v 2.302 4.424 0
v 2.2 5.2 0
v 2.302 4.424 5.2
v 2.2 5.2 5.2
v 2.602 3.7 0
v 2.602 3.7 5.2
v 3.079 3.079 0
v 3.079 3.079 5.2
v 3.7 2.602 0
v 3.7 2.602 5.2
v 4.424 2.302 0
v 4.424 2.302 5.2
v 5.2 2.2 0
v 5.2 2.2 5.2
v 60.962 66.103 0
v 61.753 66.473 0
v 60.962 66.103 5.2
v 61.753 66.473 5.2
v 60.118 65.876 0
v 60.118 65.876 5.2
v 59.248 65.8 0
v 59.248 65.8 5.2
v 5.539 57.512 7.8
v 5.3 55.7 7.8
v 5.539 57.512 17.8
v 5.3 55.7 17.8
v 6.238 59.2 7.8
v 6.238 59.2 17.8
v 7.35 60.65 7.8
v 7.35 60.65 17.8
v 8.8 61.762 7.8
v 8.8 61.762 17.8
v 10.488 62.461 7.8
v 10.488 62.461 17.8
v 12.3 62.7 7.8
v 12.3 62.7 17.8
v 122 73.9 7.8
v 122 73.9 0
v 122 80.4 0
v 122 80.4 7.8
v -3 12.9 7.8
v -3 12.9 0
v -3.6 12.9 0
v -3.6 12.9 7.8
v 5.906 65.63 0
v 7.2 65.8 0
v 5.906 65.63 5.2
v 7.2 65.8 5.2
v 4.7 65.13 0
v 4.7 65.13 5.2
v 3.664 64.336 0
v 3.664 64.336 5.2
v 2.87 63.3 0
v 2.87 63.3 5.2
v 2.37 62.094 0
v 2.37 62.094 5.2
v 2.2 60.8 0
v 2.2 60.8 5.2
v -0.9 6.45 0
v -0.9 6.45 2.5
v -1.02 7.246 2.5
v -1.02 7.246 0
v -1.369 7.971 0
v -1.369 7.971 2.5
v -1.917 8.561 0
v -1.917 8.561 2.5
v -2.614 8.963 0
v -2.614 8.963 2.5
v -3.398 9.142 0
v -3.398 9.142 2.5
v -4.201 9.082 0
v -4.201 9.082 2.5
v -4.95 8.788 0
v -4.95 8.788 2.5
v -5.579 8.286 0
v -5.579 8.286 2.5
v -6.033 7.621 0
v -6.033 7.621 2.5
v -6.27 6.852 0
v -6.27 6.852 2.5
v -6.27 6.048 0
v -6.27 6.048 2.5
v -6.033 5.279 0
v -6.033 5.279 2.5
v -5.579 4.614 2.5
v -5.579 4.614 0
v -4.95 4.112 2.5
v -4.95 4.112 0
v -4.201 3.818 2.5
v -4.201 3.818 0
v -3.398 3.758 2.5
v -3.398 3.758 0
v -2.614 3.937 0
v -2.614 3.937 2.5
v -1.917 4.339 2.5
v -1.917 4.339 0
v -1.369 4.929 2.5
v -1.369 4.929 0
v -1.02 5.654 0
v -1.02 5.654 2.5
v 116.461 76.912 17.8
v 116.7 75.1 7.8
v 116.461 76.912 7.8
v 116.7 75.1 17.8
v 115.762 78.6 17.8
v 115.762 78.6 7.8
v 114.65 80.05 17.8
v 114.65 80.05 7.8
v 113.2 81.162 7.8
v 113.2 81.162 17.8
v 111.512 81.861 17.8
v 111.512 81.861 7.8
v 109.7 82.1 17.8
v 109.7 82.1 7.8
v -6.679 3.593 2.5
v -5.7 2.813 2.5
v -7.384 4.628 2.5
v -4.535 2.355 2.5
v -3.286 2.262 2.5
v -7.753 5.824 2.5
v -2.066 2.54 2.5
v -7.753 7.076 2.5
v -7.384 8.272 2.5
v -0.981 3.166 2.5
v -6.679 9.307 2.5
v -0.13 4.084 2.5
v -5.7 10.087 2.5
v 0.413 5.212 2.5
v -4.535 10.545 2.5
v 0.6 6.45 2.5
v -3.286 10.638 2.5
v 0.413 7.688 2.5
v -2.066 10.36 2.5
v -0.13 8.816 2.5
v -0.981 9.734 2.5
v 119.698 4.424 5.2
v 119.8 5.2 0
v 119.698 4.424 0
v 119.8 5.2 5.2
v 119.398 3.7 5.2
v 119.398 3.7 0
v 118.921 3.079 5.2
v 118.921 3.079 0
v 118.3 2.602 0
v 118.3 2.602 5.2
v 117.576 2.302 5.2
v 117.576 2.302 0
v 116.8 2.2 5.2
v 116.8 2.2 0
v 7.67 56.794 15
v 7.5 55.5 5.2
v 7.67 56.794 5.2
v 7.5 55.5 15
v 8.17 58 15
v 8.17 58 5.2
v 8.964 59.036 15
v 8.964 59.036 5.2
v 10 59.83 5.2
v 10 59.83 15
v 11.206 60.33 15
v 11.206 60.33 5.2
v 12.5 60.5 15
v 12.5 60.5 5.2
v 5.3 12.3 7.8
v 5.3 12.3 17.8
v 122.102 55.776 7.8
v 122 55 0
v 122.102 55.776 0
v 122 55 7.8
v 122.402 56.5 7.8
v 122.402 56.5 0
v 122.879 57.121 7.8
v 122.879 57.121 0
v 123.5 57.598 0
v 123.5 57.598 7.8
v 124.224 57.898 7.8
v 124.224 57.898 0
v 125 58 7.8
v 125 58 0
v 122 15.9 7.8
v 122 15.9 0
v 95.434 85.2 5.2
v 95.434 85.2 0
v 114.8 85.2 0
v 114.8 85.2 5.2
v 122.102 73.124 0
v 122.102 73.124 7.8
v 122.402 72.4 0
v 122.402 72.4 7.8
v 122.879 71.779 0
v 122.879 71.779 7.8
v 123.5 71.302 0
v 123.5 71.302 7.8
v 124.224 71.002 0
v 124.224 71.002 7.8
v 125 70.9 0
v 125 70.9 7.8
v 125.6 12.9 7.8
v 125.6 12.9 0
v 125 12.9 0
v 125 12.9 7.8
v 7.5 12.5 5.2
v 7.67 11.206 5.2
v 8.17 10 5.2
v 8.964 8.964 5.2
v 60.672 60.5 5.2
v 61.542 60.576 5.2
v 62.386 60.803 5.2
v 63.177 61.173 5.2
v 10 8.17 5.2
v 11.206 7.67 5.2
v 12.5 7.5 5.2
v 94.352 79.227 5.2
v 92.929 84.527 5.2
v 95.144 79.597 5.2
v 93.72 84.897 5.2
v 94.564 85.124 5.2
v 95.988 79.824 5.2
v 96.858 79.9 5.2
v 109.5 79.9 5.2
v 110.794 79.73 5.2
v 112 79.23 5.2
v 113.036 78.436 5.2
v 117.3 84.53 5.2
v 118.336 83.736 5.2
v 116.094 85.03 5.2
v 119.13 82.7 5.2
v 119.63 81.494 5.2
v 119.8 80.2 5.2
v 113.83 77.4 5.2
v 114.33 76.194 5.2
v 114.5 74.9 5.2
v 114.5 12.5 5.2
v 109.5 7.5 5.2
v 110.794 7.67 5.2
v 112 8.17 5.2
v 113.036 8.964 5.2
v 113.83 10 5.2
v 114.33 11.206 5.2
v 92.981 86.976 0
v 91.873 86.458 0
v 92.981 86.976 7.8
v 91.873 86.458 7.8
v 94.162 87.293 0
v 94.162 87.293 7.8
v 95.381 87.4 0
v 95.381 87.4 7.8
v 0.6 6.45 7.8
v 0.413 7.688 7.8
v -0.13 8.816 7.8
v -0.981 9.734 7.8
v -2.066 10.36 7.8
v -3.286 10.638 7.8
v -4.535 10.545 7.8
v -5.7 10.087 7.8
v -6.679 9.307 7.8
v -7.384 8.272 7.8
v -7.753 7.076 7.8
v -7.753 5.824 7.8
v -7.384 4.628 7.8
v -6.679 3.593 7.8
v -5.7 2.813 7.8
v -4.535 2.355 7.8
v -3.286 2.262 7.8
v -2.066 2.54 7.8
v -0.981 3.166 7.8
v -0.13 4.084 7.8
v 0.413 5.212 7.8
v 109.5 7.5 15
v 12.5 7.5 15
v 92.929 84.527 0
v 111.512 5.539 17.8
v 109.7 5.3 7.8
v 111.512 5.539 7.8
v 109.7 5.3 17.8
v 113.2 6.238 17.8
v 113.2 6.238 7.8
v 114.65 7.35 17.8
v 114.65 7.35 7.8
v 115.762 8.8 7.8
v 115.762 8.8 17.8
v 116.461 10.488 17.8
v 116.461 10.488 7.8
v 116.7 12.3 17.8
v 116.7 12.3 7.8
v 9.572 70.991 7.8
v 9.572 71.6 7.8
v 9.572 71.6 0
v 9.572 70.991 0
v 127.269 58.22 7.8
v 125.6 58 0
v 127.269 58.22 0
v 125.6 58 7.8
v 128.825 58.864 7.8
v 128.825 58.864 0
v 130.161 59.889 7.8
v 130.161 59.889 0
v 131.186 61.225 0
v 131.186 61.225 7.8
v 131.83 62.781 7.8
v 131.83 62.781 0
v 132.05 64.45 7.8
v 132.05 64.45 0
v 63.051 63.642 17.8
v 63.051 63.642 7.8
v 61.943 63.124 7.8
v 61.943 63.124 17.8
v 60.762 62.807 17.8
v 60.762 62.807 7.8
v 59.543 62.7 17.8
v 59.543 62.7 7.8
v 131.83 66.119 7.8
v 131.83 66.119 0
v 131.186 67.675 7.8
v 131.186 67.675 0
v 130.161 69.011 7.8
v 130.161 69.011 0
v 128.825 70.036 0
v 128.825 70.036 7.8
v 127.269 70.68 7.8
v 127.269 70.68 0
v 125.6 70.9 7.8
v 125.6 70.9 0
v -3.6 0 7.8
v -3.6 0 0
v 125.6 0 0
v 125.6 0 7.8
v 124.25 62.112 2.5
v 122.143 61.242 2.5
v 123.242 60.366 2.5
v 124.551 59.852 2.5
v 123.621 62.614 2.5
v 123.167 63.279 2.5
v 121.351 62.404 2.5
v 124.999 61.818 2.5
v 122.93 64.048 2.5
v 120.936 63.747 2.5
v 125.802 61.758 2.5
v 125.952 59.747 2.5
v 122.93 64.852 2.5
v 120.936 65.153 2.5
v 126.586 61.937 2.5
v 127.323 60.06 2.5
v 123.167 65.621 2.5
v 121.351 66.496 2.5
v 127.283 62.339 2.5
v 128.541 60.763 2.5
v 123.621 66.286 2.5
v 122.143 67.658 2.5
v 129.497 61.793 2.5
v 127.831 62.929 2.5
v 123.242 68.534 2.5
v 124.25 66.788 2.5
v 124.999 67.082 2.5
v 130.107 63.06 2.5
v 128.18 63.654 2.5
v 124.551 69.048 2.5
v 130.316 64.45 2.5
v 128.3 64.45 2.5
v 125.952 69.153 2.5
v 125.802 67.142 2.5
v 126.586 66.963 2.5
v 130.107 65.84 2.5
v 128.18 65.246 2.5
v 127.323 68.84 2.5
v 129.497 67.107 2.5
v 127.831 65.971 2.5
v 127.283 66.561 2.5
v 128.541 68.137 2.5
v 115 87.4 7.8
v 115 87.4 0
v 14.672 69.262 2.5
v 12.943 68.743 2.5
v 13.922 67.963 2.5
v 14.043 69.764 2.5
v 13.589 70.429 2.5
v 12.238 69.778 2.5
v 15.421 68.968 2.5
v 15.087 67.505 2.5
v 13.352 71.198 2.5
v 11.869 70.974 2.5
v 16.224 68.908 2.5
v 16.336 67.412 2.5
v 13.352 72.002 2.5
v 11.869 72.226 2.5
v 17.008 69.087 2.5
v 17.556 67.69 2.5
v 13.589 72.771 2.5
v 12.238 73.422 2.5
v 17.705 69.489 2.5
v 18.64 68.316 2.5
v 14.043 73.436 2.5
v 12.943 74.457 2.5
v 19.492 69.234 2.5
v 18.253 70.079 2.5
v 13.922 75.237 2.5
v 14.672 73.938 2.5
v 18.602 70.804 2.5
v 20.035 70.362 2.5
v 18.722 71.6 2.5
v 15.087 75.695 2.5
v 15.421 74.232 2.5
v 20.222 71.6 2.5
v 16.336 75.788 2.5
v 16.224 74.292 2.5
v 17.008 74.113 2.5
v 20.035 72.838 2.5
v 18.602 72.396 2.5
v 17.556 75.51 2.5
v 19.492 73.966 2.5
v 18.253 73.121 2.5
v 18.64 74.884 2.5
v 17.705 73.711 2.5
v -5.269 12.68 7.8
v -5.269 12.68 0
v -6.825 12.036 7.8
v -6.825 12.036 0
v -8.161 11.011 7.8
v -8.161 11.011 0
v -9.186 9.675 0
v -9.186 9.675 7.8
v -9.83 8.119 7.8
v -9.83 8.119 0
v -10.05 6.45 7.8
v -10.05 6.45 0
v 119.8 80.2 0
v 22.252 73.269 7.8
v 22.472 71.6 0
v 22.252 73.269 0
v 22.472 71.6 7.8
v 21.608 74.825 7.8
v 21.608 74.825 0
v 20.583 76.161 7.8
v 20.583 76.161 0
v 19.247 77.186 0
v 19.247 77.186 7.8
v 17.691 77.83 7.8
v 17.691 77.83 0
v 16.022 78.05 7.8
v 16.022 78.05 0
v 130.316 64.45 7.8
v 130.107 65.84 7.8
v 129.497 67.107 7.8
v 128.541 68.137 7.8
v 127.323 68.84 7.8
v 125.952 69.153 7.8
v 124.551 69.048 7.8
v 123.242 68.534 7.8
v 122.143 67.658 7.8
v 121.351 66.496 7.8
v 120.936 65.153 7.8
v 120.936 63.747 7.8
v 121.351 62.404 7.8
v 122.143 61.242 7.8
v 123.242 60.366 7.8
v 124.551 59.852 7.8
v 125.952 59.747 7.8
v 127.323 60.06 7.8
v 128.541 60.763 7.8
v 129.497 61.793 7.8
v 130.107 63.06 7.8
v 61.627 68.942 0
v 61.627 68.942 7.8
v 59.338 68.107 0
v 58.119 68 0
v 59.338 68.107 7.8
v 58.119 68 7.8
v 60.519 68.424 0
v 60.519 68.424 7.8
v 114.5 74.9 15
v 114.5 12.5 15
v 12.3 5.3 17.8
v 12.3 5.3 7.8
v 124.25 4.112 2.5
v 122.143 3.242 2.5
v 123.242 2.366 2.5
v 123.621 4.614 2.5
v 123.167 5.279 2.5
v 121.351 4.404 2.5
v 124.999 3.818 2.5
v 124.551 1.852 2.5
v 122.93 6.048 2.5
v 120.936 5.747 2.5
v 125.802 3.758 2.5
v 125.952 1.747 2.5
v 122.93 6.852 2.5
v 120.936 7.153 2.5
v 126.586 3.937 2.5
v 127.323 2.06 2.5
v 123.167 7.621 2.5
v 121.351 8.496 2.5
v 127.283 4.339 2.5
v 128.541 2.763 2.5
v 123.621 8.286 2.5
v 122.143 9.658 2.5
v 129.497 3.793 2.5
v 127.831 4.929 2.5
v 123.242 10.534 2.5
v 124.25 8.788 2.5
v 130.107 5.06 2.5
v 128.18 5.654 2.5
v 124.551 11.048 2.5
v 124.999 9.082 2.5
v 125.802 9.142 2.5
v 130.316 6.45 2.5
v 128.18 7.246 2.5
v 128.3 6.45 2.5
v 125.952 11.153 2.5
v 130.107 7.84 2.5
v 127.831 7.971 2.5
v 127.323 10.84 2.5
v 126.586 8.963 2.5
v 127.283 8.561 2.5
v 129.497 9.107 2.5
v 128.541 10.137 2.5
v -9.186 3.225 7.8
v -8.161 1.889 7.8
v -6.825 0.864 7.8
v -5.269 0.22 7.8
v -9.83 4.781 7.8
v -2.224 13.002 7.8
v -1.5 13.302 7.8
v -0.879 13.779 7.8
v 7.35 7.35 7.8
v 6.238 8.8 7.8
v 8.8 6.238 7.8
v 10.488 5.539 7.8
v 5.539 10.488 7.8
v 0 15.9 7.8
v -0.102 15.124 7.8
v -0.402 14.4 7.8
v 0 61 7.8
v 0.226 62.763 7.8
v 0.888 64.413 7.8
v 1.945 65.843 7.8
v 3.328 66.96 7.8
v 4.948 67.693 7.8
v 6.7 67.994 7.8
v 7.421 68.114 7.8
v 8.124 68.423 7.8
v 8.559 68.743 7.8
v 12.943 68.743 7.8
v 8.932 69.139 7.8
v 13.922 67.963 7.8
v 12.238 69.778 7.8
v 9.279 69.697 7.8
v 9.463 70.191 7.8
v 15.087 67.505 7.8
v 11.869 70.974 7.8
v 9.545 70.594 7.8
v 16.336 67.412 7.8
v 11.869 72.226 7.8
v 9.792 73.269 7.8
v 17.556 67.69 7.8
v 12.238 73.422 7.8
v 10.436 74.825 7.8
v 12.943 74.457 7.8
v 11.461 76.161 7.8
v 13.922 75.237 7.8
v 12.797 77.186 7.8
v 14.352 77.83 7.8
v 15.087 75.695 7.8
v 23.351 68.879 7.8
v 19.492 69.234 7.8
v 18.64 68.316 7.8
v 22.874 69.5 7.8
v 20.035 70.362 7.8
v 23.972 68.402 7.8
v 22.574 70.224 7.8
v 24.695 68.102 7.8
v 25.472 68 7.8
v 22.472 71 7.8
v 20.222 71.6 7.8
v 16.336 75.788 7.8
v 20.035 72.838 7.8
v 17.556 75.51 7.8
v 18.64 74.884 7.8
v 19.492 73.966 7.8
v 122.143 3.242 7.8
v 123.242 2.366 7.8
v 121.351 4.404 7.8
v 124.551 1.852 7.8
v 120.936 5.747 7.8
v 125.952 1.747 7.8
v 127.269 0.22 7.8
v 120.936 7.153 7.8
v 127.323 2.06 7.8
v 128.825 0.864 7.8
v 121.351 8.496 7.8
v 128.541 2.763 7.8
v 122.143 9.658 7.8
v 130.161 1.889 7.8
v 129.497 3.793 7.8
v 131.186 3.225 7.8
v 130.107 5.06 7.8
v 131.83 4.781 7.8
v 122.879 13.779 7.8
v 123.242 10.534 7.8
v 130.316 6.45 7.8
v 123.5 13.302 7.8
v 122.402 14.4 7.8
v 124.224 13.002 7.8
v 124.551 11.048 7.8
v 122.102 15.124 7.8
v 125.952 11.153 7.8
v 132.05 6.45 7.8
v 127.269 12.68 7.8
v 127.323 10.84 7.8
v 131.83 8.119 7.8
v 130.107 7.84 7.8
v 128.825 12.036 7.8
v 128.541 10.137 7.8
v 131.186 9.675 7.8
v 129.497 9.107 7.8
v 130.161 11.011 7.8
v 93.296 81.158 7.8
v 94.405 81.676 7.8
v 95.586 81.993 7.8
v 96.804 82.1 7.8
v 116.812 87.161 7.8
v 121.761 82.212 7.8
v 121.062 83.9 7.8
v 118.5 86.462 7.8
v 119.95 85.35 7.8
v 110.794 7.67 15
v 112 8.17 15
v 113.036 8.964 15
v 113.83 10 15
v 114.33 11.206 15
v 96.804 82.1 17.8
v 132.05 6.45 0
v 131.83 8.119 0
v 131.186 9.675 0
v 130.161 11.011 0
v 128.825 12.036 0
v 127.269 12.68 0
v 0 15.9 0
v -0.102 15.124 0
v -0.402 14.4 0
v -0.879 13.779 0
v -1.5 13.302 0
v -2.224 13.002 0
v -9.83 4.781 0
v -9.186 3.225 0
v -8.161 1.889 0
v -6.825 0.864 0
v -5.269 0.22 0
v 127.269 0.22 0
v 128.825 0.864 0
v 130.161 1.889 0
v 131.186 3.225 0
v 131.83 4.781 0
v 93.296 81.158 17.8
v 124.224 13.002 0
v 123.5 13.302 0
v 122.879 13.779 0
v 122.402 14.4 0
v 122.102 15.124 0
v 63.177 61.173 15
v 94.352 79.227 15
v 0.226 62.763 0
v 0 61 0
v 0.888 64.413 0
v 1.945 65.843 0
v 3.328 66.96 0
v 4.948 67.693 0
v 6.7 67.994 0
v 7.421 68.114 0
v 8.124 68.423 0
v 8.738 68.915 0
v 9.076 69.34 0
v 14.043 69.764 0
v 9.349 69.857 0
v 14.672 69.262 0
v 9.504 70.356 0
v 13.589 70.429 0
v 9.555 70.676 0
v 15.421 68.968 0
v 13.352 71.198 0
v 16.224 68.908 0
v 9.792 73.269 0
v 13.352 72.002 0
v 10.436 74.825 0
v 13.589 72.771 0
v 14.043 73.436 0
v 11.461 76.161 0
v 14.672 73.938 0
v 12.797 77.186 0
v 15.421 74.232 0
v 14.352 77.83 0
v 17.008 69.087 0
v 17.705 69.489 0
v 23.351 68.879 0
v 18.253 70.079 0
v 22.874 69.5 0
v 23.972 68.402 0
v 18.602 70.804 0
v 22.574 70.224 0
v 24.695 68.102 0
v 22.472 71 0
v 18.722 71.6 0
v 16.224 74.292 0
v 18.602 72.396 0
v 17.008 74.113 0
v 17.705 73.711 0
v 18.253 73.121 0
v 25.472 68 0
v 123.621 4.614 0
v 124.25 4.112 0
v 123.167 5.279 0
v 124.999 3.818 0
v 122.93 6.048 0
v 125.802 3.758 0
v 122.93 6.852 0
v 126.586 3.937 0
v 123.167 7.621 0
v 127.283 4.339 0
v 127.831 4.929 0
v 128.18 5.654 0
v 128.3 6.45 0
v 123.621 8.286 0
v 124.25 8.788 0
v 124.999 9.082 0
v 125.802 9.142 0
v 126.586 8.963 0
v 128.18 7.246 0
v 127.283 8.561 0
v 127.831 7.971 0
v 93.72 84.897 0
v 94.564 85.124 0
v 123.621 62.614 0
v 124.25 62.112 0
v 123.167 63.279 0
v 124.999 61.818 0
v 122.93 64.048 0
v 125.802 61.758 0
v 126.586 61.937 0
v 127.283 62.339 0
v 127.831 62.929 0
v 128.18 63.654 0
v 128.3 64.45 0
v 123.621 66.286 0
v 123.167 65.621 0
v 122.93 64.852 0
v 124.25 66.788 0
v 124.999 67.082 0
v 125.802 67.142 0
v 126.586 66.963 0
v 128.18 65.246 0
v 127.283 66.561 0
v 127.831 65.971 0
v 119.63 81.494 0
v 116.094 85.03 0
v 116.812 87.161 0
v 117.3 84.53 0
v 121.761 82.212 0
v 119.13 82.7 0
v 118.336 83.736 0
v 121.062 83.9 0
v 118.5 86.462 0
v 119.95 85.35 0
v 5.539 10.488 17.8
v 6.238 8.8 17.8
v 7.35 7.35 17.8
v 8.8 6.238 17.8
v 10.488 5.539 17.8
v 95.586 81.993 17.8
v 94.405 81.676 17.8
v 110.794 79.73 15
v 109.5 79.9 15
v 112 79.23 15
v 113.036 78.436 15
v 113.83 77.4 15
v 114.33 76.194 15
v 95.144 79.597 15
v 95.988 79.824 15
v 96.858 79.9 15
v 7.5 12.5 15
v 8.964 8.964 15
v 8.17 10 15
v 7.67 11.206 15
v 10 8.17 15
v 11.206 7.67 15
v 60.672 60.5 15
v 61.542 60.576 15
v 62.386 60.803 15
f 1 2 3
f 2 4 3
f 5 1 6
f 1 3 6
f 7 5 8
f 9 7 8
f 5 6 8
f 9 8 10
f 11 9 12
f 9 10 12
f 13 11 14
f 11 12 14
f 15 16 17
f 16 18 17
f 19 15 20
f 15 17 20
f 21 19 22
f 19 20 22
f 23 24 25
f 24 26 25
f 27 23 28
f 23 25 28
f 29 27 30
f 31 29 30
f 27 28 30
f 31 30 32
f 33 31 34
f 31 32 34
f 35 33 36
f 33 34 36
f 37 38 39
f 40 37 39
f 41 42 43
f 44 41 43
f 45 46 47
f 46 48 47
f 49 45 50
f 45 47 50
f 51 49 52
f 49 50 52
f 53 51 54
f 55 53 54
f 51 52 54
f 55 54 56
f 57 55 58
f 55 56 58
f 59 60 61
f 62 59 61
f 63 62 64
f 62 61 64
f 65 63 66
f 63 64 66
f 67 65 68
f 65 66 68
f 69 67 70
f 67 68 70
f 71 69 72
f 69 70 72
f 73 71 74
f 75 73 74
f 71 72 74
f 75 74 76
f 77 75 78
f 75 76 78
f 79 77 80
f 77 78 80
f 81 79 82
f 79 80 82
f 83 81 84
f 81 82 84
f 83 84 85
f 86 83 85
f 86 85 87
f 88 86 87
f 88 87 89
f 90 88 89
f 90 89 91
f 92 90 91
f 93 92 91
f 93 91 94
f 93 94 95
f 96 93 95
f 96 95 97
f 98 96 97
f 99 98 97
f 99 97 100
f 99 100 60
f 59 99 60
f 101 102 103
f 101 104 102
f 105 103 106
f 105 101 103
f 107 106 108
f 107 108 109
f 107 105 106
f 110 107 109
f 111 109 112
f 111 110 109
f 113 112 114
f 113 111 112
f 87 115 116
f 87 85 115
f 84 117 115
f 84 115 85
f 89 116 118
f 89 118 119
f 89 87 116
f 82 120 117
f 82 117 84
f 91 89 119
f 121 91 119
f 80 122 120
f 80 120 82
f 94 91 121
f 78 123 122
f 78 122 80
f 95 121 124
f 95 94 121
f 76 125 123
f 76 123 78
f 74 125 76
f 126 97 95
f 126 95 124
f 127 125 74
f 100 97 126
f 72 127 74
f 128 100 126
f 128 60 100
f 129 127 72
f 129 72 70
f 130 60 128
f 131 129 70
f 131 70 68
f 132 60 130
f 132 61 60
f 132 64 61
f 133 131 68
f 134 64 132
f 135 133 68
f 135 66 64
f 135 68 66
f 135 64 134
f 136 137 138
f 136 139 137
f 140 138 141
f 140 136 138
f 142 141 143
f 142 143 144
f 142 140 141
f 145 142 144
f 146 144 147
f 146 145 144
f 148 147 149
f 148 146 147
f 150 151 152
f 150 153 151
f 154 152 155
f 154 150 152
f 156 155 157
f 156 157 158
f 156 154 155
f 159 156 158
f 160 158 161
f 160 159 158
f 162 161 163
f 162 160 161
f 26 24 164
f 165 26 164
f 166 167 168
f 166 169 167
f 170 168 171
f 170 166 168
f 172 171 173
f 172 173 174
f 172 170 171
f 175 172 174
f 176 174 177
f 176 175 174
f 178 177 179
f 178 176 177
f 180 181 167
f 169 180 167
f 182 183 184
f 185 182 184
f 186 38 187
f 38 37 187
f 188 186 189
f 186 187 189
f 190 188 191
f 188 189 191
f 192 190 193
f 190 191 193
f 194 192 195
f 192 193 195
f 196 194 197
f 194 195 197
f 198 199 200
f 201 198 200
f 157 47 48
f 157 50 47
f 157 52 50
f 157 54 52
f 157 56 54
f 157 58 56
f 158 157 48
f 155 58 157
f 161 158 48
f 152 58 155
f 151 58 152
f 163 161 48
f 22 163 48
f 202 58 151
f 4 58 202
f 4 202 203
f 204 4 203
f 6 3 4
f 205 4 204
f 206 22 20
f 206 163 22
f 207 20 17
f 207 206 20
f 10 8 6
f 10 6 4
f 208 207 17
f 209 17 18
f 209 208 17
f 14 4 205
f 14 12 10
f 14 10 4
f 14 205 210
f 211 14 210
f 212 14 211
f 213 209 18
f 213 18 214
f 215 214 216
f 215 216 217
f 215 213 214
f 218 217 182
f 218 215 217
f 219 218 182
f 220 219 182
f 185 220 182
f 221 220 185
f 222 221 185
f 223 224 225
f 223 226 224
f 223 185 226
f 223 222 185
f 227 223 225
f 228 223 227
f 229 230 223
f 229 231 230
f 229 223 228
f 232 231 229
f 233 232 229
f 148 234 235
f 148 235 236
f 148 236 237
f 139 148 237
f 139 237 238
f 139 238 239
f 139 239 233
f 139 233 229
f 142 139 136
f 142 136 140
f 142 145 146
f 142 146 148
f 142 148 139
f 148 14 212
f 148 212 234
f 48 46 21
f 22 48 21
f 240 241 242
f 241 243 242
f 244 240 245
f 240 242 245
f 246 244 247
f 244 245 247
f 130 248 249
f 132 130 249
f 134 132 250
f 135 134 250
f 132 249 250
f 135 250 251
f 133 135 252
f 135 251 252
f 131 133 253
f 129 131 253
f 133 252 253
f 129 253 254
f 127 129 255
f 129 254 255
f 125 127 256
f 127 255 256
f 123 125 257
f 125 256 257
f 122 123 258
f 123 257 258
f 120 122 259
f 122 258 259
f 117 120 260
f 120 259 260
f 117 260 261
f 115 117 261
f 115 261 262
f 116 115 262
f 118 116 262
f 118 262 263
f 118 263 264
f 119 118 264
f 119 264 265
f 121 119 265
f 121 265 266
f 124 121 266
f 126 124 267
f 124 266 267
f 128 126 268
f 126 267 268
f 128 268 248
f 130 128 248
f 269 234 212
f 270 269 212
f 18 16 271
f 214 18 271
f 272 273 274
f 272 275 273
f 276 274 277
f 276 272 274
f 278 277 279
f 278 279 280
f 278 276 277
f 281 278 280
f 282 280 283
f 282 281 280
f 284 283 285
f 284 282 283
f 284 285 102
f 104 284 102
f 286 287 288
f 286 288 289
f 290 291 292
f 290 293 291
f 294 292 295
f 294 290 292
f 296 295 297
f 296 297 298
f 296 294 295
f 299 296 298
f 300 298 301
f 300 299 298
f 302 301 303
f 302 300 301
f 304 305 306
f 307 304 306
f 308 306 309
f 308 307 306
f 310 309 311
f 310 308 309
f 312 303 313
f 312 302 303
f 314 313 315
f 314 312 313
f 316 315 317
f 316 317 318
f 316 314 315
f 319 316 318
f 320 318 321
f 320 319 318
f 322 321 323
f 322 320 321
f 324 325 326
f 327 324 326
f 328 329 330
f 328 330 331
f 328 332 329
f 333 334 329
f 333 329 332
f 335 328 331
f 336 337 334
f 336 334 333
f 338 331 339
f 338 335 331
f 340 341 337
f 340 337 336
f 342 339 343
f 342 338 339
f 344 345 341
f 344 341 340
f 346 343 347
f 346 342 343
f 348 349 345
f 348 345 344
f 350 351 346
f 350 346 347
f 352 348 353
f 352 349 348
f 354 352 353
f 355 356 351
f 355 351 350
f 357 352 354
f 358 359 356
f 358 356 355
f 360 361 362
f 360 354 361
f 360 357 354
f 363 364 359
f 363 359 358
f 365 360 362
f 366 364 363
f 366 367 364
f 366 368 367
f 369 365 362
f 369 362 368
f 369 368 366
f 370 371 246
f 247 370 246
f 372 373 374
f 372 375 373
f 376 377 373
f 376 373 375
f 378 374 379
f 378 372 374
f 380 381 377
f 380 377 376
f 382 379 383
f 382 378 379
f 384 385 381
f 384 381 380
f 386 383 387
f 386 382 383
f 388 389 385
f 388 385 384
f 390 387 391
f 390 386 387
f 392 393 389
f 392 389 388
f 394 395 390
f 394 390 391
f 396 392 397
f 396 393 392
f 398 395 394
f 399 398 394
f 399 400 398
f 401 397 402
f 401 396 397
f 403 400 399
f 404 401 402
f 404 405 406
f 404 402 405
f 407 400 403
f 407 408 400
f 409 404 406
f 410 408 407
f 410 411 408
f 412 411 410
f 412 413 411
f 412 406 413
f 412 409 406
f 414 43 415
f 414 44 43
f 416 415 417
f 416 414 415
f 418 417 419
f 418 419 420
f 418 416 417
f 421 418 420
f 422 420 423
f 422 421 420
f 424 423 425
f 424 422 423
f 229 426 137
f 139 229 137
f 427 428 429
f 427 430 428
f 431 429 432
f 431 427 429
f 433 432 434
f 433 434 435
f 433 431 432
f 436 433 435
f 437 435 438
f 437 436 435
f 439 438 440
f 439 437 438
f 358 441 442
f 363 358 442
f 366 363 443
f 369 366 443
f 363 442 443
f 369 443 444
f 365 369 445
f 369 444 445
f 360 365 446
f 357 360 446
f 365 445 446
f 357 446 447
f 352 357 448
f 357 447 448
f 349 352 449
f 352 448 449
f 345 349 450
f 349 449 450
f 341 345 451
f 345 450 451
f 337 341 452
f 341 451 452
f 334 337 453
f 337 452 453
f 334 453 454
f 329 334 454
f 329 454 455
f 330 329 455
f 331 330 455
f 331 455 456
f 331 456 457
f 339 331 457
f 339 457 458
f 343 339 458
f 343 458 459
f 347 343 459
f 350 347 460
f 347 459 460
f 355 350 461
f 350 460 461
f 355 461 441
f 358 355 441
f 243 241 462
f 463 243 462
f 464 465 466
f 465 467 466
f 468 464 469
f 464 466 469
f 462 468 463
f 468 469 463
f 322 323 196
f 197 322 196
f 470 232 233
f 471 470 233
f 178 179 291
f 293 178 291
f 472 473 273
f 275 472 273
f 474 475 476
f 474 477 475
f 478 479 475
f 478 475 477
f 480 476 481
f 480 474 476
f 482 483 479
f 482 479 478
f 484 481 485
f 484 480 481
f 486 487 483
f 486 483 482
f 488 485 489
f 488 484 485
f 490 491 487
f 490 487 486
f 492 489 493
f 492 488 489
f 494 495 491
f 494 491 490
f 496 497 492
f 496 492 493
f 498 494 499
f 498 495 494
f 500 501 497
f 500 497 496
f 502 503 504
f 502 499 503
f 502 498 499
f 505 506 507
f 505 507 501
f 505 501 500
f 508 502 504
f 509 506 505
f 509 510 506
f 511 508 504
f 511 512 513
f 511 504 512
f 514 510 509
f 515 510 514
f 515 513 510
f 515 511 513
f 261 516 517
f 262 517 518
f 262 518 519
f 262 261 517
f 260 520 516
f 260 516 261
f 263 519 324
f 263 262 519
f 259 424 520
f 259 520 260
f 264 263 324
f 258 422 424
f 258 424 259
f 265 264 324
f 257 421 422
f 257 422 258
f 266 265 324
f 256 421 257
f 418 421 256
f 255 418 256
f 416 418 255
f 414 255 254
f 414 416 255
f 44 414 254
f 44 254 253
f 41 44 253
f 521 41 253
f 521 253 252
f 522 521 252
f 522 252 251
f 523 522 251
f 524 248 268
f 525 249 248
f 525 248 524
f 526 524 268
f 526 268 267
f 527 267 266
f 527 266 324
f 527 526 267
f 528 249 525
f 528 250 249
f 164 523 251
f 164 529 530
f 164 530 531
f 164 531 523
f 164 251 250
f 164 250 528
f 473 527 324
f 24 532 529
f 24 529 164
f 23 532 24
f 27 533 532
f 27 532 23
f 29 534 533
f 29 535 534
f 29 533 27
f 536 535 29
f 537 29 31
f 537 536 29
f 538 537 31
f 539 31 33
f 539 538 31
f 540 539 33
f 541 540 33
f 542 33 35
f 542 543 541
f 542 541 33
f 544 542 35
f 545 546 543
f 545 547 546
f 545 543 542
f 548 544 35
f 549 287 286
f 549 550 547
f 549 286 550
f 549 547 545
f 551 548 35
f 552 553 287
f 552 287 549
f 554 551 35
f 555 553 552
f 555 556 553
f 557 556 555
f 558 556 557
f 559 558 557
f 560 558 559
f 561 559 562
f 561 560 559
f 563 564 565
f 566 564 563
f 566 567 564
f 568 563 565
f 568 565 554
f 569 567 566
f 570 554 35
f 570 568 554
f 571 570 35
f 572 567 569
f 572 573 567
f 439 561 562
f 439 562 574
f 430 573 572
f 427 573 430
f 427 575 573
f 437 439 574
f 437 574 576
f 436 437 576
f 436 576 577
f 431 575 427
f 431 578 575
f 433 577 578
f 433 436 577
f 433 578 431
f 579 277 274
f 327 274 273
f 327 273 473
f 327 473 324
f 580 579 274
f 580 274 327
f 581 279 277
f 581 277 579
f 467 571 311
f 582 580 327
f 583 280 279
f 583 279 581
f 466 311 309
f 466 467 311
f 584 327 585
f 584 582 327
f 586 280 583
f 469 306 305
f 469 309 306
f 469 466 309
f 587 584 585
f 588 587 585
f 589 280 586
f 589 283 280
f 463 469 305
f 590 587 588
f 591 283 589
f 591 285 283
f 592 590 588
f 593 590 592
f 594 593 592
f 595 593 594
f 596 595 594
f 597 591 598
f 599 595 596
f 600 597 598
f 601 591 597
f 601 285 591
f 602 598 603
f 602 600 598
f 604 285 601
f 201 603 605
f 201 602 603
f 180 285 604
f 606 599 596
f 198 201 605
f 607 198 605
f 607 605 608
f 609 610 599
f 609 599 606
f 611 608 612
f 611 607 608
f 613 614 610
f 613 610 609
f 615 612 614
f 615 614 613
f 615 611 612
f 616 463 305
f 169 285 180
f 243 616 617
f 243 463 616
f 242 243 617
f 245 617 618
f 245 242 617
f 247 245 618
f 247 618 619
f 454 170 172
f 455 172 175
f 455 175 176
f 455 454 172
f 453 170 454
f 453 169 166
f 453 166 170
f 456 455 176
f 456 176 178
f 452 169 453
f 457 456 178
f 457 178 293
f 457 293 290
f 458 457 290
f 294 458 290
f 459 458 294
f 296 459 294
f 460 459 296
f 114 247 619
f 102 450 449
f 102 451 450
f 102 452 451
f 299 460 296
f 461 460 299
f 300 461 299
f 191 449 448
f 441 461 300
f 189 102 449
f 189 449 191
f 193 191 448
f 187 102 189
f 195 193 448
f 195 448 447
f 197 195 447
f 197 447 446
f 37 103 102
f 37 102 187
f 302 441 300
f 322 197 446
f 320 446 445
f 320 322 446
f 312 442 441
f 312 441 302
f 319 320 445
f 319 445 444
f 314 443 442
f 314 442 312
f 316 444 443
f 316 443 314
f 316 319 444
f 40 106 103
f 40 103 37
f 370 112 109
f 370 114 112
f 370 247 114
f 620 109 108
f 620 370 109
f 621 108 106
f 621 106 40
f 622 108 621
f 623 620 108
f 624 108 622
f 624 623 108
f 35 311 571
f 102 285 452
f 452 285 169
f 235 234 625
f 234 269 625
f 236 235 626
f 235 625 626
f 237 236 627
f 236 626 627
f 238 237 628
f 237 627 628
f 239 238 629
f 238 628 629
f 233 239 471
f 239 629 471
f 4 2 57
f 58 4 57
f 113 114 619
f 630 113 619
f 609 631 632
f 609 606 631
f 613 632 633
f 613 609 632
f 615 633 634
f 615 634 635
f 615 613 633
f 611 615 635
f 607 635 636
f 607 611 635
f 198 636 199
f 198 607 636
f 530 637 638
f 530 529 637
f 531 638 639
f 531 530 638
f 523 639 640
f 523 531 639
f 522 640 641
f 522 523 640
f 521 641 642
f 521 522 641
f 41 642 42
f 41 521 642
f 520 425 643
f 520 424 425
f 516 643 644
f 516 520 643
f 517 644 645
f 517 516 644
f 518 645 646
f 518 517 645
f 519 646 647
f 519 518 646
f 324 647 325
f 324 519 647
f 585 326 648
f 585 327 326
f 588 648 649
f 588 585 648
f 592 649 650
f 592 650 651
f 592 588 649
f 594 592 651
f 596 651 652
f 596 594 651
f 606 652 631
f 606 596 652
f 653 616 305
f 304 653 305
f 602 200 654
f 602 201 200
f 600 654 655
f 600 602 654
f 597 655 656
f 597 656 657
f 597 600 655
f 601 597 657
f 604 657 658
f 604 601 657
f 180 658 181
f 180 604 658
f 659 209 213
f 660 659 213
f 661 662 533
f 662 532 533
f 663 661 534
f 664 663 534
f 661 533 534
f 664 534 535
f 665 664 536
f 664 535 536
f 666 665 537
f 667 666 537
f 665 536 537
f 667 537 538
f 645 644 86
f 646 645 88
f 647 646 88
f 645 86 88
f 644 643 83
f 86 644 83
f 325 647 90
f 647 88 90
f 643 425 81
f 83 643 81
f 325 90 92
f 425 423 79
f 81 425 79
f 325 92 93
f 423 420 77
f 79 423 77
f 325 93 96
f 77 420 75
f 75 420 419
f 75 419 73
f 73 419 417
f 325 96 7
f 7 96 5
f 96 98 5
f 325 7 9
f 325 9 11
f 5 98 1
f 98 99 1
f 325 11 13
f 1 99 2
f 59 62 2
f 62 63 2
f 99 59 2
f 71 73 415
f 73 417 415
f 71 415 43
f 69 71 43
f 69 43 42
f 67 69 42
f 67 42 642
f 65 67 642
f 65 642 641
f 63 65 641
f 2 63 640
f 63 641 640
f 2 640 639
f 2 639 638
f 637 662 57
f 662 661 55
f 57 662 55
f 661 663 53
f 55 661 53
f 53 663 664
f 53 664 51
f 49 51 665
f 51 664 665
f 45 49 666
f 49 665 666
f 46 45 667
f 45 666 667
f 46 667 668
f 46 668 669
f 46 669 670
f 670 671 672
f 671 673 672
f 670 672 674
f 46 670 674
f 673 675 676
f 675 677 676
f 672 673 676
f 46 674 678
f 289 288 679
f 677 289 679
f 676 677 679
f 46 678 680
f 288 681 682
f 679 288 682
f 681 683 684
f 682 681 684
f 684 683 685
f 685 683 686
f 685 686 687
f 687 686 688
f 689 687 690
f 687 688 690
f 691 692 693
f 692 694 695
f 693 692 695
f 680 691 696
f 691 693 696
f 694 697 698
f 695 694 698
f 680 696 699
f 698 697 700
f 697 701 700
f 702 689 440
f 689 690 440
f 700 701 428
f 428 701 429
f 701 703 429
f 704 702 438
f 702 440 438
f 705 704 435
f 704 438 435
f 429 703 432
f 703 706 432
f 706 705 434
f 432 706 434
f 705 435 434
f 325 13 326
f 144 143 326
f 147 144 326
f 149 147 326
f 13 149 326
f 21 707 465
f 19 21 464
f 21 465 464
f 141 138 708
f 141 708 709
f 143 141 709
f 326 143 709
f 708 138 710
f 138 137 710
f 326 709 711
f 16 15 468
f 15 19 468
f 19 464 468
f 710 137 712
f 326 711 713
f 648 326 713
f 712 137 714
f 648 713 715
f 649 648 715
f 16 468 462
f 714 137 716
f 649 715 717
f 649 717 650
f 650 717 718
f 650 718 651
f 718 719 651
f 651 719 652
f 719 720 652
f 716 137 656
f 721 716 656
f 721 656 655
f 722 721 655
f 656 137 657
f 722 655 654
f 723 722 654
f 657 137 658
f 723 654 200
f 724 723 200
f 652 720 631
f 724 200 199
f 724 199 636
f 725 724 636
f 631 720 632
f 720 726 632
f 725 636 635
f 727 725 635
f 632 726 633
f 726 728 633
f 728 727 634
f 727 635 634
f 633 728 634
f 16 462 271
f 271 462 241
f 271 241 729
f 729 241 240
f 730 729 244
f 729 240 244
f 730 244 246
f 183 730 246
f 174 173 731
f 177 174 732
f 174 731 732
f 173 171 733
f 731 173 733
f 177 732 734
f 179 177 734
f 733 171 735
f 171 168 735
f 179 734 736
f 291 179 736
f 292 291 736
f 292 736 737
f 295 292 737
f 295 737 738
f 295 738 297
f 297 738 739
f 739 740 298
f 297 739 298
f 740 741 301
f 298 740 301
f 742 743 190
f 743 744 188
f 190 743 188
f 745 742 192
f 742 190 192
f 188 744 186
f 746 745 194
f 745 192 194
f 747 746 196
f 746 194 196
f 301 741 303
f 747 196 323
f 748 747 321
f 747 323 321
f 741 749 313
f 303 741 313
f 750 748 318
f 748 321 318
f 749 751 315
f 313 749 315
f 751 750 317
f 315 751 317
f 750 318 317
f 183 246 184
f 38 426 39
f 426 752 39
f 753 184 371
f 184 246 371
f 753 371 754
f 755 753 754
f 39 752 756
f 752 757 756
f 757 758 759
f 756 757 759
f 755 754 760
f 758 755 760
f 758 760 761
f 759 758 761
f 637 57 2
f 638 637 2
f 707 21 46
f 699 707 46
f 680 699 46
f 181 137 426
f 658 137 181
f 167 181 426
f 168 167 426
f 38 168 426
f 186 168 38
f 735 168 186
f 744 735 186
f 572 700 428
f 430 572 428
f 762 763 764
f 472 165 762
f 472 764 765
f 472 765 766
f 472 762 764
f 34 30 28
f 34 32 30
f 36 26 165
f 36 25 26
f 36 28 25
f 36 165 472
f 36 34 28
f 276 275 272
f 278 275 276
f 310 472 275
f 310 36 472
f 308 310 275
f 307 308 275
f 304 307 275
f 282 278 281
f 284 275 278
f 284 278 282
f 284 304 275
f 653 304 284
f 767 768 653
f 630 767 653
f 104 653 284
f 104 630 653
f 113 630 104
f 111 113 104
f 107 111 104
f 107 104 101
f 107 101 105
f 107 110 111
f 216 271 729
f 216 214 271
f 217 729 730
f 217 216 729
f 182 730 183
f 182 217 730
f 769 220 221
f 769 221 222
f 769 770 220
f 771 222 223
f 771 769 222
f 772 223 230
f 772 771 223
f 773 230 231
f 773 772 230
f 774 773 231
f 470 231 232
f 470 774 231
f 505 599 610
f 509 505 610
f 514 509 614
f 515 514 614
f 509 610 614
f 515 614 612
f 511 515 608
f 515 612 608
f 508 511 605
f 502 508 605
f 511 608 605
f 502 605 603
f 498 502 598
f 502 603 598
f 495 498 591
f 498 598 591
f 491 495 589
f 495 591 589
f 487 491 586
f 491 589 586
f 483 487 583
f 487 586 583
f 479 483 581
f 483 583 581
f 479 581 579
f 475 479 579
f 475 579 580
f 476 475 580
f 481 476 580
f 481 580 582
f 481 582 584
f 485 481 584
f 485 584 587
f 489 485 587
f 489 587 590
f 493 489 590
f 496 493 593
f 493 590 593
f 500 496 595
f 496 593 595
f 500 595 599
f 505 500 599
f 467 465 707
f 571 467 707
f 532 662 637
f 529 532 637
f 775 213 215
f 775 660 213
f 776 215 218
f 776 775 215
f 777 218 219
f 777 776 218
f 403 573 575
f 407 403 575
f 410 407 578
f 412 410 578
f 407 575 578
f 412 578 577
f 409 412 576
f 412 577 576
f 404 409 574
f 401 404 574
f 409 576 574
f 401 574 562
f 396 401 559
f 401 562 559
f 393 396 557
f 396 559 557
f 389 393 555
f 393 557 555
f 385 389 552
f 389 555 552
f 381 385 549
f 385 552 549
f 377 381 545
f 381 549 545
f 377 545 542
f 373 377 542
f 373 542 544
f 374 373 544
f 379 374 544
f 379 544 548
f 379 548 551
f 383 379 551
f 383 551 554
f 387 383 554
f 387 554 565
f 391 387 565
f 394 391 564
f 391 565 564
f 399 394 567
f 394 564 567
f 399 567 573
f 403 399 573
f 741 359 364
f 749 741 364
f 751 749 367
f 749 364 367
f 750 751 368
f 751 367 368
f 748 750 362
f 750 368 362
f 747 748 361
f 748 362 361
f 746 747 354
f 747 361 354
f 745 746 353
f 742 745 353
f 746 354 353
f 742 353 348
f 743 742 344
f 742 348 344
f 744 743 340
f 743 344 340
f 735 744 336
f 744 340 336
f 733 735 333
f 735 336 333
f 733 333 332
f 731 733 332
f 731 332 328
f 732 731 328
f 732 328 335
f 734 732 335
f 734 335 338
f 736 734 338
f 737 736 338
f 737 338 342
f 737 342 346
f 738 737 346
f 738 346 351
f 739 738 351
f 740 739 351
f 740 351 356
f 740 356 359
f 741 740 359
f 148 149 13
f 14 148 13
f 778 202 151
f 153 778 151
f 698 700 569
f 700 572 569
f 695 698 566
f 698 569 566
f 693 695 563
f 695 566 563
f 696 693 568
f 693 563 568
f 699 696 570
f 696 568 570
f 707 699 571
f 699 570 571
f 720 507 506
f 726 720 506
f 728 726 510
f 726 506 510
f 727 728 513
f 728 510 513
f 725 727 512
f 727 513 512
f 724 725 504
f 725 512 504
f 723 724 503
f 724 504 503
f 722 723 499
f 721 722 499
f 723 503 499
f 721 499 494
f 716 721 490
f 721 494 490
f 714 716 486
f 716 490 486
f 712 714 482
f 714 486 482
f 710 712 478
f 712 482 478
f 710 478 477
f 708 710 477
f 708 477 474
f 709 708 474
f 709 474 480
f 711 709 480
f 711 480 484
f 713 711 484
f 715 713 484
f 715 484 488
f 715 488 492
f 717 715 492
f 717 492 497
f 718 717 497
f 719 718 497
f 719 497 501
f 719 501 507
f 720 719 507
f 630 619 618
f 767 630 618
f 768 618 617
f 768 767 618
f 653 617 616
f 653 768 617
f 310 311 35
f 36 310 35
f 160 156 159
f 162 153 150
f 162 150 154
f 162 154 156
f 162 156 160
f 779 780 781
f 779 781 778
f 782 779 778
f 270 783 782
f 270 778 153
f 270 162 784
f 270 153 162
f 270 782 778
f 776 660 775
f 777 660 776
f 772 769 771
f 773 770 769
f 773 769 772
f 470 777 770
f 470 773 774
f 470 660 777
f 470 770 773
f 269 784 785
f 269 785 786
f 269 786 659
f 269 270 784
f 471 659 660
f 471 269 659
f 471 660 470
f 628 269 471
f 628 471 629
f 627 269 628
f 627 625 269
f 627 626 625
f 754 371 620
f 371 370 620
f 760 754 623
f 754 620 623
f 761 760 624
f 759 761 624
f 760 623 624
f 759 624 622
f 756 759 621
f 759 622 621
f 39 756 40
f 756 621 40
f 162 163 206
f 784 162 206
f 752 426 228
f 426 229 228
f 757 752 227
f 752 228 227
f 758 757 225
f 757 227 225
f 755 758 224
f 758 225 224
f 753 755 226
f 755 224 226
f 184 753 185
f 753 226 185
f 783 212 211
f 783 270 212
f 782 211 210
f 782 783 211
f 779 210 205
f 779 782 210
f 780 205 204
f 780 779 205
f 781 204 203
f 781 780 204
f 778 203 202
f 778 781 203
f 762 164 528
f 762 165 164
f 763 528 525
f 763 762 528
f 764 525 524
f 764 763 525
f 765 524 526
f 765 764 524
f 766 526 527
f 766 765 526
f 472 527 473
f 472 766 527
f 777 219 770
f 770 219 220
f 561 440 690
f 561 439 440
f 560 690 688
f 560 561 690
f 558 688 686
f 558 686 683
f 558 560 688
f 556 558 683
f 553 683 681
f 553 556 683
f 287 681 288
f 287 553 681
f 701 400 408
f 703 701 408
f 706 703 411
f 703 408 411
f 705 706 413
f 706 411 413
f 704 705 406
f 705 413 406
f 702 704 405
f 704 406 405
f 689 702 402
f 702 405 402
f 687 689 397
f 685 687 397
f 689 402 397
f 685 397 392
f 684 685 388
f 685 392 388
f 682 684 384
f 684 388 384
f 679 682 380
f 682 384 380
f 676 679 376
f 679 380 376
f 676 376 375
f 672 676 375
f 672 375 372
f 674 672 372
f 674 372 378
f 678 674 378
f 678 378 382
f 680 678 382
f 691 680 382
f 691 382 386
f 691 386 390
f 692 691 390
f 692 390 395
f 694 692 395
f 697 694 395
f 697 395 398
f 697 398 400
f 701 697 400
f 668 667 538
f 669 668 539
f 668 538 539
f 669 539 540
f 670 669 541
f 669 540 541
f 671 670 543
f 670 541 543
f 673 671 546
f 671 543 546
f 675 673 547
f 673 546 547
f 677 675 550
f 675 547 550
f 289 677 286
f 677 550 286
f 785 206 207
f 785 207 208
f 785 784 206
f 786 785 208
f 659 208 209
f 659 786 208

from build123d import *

# Parameters (mm, degrees)
F1_DEPTH  = 7.8
F2_R      = 6.44999
F3_R      = 2.7
F4_DEPTH  = 7.801
F5_R      = 4.2
F5_R_2    = 4.7163688055
F6_DEPTH  = 5.3
F8_DEPTH  = 10
F10_DEPTH = 5.2
F12_DEPTH = 9.8
F13_R     = 5
F14_R     = 7
F15_R     = 3
F16_R     = 3


# Not quite as in the source:
# - a fillet or chamfer is up to 0.001 mm smaller than in the source, because OpenCascade refuses the exact size


with BuildPart() as f1:
    # F0 (on Top) → F1 (new body)
    with BuildSketch(Plane.XY):
        Polygon((0, 68), (0, 12.9), (-10.05, 12.9), (-10.05, 0), (0, 0), (122, 0), (132.05, 0), (132.05, 12.9), (122, 12.9), (122, 58), (132.05, 58), (132.05, 70.9), (122, 70.9), (122, 87.4), (93.5, 87.4), (60, 68), (22.4718242228, 68), (22.4718242228, 78.05), (9.5718242228, 78.05), (9.5718242228, 68), align=None)
    extrude(amount=F1_DEPTH)

    # F2 (radius 6.45 in the source; OpenCascade refuses exactly that, so slightly less here)
    f2_edges = [f1.edges().sort_by_distance(p)[0] for p in [
        (-10.05, 0, 3.9),
        (-10.05, 12.9, 3.9),
        (9.571824, 78.05, 3.9),
        (22.471824, 78.05, 3.9),
        (132.05, 70.9, 3.9),
        (132.05, 58, 3.9),
        (132.05, 12.9, 3.9),
        (132.05, 0, 3.9),
    ]]
    fillet(f2_edges, radius=F2_R)

    # F3 (on face) → F4 (cut, through all)
    with BuildSketch(Plane.XY.offset(7.8)):
        with Locations((-3.6, 6.45)):
            Circle(F3_R)
        with Locations((16.0218242228, 71.6)):
            Circle(F3_R)
        with Locations((125.6, 64.45)):
            Circle(F3_R)
        with Locations((125.6, 6.45)):
            Circle(F3_R)
    extrude(amount=-F4_DEPTH, mode=Mode.SUBTRACT)

    # F5 (on face) → F6 (cut)
    with BuildSketch(Plane.XY.offset(7.8)):
        with Locations((-3.6, 6.45)):
            Circle(F5_R)
        with Locations((16.0218242228, 71.6)):
            Circle(F5_R)
        with Locations((125.6, 64.45)):
            Circle(F5_R_2)
        with Locations((125.6, 6.45)):
            Circle(F5_R_2)
    extrude(amount=-F6_DEPTH, mode=Mode.SUBTRACT)

    # F7 (on face) → F8 (join)
    with BuildSketch(Plane.XY.offset(7.8)):
        Polygon((5.3, 62.7), (5.3, 5.3), (116.7, 5.3), (116.7, 82.1), (94.9238653477, 82.1), (61.4238653477, 62.7), align=None)
    extrude(amount=F8_DEPTH)

    # F9 (on face) → F10 (cut)
    with BuildSketch(Plane(origin=(0, 0, 0), x_dir=(1, 0, 0), z_dir=(0, 0, -1))):
        Polygon((94.0910384462, -85.2), (119.8, -85.2), (119.8, -2.2), (2.2, -2.2), (2.2, -65.8), (60.5910384462, -65.8), align=None)
    extrude(amount=-F10_DEPTH, mode=Mode.SUBTRACT)

    # F11 (on face) → F12 (cut)
    with BuildSketch(Plane(origin=(0, 0, 5.2), x_dir=(1, 0, 0), z_dir=(0, 0, -1))):
        Polygon((114.5, -7.5), (7.5, -7.5), (7.5, -60.5), (62.0149037939, -60.5), (95.5149037939, -79.9), (114.5, -79.9), align=None)
    extrude(amount=-F12_DEPTH, mode=Mode.SUBTRACT)

    # F13
    f13_edges = [f1.edges().sort_by_distance(p)[0] for p in [
        (114.5, 79.9, 10.1),
        (119.8, 85.2, 2.6),
        (7.5, 60.5, 10.1),
        (2.2, 65.8, 2.6),
        (114.5, 7.5, 10.1),
        (7.5, 7.5, 10.1),
        (95.514904, 79.9, 10.1),
        (62.014904, 60.5, 10.1),
        (60.591038, 65.8, 2.6),
        (94.091038, 85.2, 2.6),
    ]]
    fillet(f13_edges, radius=F13_R)

    # F14
    f14_edges = [f1.edges().sort_by_distance(p)[0] for p in [
        (122, 87.4, 3.9),
        (93.5, 87.4, 3.9),
        (60, 68, 3.9),
        (61.423865, 62.7, 12.8),
        (94.923865, 82.1, 12.8),
        (116.7, 82.1, 12.8),
        (116.7, 5.3, 12.8),
        (5.3, 5.3, 12.8),
        (5.3, 62.7, 12.8),
        (0, 68, 3.9),
    ]]
    fillet(f14_edges, radius=F14_R)

    # F15
    f15_edges = [f1.edges().sort_by_distance(p)[0] for p in [
        (119.8, 2.2, 2.6),
        (2.2, 2.2, 2.6),
    ]]
    fillet(f15_edges, radius=F15_R)

    # F16
    f16_edges = [f1.edges().sort_by_distance(p)[0] for p in [
        (0, 12.9, 3.9),
        (9.571824, 68, 3.9),
        (22.471824, 68, 3.9),
        (122, 70.9, 3.9),
        (122, 58, 3.9),
        (122, 12.9, 3.9),
    ]]
    fillet(f16_edges, radius=F16_R)


solid = f1.part
